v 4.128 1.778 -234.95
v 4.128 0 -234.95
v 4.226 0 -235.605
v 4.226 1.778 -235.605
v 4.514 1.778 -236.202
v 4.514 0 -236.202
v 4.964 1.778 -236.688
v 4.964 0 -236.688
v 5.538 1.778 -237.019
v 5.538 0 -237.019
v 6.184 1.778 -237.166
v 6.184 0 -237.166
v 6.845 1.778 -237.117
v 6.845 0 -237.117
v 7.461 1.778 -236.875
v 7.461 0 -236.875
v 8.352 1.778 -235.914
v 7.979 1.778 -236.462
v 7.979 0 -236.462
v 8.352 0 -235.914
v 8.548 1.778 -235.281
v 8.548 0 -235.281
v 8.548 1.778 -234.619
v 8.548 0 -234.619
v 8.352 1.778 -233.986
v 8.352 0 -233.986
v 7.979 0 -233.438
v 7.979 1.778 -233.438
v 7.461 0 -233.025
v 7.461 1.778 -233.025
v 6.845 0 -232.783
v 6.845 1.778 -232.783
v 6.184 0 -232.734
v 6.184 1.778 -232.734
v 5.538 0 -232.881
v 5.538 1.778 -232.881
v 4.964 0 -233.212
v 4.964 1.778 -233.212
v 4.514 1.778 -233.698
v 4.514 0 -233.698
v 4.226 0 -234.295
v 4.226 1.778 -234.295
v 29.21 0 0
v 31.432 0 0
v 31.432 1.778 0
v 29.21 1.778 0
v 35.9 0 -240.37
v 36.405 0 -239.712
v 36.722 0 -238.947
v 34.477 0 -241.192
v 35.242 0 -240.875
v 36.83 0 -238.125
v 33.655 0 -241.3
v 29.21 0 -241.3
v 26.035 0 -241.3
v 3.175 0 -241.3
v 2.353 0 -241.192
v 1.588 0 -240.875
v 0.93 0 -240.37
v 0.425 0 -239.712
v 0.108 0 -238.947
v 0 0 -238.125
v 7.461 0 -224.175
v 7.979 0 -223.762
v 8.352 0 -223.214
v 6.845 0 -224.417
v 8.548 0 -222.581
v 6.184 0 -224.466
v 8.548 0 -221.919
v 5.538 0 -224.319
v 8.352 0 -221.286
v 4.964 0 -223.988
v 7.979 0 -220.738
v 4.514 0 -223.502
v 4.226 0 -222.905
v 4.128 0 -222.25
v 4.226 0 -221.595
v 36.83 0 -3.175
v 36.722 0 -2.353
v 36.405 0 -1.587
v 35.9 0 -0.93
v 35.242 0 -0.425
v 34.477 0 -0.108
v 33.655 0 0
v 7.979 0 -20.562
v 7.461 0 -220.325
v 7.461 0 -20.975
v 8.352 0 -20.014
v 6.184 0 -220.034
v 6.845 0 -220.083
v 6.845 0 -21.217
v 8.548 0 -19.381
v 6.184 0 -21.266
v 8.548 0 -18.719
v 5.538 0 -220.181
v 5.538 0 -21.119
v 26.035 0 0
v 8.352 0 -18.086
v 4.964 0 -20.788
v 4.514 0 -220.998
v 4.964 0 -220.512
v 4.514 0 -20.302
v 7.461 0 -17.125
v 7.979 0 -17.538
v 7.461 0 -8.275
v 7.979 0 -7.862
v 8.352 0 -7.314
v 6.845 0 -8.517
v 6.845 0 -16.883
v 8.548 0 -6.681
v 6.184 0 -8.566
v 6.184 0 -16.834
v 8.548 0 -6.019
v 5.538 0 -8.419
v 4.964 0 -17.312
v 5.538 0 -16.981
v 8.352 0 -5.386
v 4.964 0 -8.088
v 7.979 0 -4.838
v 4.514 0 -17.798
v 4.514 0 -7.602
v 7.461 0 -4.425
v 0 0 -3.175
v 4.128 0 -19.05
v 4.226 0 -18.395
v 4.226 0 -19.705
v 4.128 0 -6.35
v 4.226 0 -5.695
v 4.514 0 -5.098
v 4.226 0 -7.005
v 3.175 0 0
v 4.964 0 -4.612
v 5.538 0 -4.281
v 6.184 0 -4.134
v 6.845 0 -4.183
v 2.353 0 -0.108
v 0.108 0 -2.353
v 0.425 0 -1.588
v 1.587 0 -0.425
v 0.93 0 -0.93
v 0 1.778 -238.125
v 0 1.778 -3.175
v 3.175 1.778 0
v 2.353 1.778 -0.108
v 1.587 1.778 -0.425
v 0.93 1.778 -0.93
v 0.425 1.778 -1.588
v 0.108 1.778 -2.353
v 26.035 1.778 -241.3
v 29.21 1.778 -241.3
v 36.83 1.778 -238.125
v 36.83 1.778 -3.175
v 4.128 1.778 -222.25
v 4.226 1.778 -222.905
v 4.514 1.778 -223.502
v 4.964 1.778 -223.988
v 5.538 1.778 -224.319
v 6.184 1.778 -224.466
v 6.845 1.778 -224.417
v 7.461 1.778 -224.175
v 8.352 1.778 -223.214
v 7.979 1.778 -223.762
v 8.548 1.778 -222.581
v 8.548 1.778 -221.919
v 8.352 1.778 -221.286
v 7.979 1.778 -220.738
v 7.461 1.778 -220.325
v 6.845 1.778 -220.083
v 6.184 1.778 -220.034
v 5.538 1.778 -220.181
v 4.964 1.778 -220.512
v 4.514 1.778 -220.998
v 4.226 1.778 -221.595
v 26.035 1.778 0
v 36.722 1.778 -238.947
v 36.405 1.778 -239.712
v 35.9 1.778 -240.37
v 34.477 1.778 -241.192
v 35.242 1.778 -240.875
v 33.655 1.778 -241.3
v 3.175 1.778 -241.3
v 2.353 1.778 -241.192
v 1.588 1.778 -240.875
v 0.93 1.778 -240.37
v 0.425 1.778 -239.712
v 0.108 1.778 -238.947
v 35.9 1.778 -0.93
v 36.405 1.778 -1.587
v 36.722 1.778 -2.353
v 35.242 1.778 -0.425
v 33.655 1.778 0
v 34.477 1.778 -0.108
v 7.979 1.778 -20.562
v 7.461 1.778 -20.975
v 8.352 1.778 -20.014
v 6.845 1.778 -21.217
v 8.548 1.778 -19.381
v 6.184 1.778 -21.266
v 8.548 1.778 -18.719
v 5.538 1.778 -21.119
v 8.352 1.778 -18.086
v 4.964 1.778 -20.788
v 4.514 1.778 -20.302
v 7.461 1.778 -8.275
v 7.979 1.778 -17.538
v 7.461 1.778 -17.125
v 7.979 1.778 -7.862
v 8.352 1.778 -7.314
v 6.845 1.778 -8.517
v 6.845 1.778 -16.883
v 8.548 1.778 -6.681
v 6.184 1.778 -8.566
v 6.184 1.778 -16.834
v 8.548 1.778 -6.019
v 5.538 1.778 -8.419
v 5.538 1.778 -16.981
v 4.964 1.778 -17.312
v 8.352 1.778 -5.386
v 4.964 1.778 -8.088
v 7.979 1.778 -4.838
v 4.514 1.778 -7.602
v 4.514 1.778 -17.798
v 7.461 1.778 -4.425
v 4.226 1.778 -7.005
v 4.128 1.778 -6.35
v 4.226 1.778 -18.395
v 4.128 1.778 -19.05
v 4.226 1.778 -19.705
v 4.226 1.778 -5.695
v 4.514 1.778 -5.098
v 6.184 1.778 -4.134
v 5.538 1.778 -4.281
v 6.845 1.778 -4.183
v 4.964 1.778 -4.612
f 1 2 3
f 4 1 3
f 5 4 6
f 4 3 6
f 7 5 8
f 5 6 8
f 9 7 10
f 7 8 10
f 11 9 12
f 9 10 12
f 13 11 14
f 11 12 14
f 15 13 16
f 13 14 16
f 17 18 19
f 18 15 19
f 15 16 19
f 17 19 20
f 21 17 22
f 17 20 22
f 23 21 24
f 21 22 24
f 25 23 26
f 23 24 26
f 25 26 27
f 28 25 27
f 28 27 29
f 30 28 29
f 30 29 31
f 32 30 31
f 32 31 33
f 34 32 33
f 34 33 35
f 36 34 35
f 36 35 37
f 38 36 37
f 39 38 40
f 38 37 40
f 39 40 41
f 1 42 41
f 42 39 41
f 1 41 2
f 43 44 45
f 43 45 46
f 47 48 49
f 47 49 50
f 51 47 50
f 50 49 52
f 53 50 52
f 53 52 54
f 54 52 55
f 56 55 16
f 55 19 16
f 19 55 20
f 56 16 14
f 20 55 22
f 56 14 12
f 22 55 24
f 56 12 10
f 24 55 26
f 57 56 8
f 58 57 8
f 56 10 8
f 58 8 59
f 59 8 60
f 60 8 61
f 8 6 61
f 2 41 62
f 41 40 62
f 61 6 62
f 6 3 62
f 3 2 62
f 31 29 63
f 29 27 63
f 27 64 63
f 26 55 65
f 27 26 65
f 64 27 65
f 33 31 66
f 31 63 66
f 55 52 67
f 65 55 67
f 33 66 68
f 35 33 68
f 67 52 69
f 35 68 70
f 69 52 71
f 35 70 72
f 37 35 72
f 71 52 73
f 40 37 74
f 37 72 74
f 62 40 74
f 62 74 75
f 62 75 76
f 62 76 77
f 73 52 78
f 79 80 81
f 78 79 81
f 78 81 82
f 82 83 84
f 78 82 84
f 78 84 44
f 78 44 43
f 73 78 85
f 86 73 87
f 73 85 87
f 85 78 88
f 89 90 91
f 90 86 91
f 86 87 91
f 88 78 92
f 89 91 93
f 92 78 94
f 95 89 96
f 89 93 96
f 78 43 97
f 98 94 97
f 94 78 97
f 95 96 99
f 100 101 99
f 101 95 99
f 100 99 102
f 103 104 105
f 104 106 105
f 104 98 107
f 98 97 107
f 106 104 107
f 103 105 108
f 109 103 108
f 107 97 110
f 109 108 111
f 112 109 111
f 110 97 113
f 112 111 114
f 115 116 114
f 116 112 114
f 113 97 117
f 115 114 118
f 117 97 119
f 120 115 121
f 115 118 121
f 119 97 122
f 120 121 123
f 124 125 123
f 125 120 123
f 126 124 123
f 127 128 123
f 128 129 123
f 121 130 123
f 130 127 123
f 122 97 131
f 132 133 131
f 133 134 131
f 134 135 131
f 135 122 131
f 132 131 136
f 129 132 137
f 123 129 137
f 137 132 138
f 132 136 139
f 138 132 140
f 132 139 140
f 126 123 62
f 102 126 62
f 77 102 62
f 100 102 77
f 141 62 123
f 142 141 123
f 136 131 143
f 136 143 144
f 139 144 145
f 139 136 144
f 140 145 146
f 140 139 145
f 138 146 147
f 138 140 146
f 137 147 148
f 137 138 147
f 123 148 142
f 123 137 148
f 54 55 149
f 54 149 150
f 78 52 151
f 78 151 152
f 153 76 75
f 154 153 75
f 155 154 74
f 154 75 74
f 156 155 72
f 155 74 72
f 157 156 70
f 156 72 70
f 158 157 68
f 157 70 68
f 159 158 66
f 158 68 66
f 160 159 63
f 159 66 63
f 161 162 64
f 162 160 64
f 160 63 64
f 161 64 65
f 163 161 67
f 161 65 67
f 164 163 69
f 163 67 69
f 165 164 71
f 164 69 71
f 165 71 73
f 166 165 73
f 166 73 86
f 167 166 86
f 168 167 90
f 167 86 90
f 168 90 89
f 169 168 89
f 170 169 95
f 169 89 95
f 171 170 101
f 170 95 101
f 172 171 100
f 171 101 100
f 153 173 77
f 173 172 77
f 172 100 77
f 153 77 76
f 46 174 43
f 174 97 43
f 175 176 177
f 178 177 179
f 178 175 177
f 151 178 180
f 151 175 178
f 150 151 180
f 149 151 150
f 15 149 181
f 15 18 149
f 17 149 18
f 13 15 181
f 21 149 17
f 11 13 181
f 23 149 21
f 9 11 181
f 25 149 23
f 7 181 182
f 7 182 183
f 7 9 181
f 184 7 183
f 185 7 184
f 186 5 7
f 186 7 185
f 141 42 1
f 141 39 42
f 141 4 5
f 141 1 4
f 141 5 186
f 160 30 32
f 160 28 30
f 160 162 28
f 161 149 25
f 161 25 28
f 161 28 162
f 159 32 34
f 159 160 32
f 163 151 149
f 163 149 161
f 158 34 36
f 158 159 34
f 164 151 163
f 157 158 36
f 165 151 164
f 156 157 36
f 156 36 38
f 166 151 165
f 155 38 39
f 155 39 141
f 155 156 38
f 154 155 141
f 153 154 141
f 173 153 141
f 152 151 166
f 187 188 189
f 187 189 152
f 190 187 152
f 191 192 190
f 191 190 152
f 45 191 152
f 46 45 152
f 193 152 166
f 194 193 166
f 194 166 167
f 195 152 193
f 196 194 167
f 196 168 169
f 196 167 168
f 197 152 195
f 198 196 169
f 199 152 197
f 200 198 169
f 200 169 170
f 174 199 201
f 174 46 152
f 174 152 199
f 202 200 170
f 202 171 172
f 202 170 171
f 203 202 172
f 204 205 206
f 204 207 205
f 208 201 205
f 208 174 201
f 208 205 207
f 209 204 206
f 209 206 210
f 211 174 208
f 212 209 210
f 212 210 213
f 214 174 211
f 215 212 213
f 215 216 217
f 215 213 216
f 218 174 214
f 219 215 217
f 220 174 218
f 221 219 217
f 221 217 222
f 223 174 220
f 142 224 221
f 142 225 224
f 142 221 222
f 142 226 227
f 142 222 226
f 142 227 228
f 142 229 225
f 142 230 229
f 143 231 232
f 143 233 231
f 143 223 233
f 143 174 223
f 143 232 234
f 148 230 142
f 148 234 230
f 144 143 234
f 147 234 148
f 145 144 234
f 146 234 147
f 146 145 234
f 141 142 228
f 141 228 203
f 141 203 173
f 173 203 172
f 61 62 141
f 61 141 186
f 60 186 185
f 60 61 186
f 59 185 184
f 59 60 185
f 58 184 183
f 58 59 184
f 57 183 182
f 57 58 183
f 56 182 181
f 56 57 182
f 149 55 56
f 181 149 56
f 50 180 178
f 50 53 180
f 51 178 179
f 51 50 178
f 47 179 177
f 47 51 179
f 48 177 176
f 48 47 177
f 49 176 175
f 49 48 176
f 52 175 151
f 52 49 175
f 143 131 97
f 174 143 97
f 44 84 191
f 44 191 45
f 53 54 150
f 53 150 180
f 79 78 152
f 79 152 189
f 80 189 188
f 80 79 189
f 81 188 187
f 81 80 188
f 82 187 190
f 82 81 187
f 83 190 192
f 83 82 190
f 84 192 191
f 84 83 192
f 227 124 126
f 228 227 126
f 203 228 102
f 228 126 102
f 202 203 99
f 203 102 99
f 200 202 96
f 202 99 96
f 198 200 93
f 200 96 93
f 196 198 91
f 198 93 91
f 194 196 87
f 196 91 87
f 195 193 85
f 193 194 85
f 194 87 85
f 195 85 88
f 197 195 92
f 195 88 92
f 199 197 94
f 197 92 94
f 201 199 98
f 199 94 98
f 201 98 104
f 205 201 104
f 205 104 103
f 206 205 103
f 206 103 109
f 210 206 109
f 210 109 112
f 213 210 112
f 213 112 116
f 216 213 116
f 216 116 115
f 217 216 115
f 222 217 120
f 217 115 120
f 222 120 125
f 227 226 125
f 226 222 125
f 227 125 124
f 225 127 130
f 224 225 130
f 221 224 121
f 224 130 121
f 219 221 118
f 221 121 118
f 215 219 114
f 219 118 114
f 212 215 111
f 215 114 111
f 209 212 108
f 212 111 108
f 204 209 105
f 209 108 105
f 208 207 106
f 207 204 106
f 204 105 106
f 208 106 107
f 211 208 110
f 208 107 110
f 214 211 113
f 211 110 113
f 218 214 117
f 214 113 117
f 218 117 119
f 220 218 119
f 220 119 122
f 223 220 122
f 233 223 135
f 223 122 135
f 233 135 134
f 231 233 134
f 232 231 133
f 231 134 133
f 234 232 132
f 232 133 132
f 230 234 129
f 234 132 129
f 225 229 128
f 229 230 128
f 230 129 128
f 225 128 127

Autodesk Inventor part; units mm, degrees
ref_plane "YZ Plane" through (0, 0, 0) normal (1, 0, 0) x (0, 1, 0)
ref_plane "XZ Plane" through (0, 0, 0) normal (0, 1, 0) x (-1, 0, 0)
ref_plane "XY Plane" through (0, 0, 0) normal (0, 0, 1) x (1, 0, 0)
sketch "Sketch1" plane through (0, 0, 0) normal (0, 1, 0) x (-1, 0, 0)
  line L0 (-3.175, 0) -> (-26.035, 0)
  line L1 (-26.035, -241.3) -> (-3.175, -241.3)
  line L2 (0, -238.125) -> (0, -3.175)
  circle A0 centre (-6.35, -6.35) radius 2.2225
  circle A1 centre (-6.35, -19.05) radius 2.2225
  circle A2 centre (-6.35, -234.95) radius 2.2225
  circle A3 centre (-6.35, -222.25) radius 2.2225
  arc A4 (0, -3.175) -> (-3.175, 0) centre (-3.175, -3.175) ccw
  arc A5 (-3.175, -241.3) -> (0, -238.125) centre (-3.175, -238.125) ccw
  line L3 (-26.035, -241.3) -> (-29.21, -241.3)
  line L4 (-29.21, -241.3) -> (-33.655, -241.3)
  line L5 (-36.83, -238.125) -> (-36.83, -3.175)
  line L6 (-33.655, 0) -> (-29.21, 0)
  arc A6 (-36.83, -238.125) -> (-33.655, -241.3) centre (-33.655, -238.125) ccw
  arc A7 (-33.655, 0) -> (-36.83, -3.175) centre (-33.655, -3.175) ccw
  line L7 (-26.035, 0) -> (-31.4325, 0)
  point P0 (0, 0)
  point P1 (0, -241.3)
  point P2 (-36.83, -241.3)
  dimension "d0" = 29.21
  dimension "d2" = 4.445
  dimension "d3" = 4.445
  dimension "d4" = 4.445
  dimension "d5" = 4.445
  dimension "d6" = 3.175
  dimension "d7" = 7.62
  dimension "d8" = 3.175
  dimension "d9" = 3.175
extrude "Extrusion1" add sketch "Sketch1" along normal blind 1.778
properties part number "holder_wedge"
